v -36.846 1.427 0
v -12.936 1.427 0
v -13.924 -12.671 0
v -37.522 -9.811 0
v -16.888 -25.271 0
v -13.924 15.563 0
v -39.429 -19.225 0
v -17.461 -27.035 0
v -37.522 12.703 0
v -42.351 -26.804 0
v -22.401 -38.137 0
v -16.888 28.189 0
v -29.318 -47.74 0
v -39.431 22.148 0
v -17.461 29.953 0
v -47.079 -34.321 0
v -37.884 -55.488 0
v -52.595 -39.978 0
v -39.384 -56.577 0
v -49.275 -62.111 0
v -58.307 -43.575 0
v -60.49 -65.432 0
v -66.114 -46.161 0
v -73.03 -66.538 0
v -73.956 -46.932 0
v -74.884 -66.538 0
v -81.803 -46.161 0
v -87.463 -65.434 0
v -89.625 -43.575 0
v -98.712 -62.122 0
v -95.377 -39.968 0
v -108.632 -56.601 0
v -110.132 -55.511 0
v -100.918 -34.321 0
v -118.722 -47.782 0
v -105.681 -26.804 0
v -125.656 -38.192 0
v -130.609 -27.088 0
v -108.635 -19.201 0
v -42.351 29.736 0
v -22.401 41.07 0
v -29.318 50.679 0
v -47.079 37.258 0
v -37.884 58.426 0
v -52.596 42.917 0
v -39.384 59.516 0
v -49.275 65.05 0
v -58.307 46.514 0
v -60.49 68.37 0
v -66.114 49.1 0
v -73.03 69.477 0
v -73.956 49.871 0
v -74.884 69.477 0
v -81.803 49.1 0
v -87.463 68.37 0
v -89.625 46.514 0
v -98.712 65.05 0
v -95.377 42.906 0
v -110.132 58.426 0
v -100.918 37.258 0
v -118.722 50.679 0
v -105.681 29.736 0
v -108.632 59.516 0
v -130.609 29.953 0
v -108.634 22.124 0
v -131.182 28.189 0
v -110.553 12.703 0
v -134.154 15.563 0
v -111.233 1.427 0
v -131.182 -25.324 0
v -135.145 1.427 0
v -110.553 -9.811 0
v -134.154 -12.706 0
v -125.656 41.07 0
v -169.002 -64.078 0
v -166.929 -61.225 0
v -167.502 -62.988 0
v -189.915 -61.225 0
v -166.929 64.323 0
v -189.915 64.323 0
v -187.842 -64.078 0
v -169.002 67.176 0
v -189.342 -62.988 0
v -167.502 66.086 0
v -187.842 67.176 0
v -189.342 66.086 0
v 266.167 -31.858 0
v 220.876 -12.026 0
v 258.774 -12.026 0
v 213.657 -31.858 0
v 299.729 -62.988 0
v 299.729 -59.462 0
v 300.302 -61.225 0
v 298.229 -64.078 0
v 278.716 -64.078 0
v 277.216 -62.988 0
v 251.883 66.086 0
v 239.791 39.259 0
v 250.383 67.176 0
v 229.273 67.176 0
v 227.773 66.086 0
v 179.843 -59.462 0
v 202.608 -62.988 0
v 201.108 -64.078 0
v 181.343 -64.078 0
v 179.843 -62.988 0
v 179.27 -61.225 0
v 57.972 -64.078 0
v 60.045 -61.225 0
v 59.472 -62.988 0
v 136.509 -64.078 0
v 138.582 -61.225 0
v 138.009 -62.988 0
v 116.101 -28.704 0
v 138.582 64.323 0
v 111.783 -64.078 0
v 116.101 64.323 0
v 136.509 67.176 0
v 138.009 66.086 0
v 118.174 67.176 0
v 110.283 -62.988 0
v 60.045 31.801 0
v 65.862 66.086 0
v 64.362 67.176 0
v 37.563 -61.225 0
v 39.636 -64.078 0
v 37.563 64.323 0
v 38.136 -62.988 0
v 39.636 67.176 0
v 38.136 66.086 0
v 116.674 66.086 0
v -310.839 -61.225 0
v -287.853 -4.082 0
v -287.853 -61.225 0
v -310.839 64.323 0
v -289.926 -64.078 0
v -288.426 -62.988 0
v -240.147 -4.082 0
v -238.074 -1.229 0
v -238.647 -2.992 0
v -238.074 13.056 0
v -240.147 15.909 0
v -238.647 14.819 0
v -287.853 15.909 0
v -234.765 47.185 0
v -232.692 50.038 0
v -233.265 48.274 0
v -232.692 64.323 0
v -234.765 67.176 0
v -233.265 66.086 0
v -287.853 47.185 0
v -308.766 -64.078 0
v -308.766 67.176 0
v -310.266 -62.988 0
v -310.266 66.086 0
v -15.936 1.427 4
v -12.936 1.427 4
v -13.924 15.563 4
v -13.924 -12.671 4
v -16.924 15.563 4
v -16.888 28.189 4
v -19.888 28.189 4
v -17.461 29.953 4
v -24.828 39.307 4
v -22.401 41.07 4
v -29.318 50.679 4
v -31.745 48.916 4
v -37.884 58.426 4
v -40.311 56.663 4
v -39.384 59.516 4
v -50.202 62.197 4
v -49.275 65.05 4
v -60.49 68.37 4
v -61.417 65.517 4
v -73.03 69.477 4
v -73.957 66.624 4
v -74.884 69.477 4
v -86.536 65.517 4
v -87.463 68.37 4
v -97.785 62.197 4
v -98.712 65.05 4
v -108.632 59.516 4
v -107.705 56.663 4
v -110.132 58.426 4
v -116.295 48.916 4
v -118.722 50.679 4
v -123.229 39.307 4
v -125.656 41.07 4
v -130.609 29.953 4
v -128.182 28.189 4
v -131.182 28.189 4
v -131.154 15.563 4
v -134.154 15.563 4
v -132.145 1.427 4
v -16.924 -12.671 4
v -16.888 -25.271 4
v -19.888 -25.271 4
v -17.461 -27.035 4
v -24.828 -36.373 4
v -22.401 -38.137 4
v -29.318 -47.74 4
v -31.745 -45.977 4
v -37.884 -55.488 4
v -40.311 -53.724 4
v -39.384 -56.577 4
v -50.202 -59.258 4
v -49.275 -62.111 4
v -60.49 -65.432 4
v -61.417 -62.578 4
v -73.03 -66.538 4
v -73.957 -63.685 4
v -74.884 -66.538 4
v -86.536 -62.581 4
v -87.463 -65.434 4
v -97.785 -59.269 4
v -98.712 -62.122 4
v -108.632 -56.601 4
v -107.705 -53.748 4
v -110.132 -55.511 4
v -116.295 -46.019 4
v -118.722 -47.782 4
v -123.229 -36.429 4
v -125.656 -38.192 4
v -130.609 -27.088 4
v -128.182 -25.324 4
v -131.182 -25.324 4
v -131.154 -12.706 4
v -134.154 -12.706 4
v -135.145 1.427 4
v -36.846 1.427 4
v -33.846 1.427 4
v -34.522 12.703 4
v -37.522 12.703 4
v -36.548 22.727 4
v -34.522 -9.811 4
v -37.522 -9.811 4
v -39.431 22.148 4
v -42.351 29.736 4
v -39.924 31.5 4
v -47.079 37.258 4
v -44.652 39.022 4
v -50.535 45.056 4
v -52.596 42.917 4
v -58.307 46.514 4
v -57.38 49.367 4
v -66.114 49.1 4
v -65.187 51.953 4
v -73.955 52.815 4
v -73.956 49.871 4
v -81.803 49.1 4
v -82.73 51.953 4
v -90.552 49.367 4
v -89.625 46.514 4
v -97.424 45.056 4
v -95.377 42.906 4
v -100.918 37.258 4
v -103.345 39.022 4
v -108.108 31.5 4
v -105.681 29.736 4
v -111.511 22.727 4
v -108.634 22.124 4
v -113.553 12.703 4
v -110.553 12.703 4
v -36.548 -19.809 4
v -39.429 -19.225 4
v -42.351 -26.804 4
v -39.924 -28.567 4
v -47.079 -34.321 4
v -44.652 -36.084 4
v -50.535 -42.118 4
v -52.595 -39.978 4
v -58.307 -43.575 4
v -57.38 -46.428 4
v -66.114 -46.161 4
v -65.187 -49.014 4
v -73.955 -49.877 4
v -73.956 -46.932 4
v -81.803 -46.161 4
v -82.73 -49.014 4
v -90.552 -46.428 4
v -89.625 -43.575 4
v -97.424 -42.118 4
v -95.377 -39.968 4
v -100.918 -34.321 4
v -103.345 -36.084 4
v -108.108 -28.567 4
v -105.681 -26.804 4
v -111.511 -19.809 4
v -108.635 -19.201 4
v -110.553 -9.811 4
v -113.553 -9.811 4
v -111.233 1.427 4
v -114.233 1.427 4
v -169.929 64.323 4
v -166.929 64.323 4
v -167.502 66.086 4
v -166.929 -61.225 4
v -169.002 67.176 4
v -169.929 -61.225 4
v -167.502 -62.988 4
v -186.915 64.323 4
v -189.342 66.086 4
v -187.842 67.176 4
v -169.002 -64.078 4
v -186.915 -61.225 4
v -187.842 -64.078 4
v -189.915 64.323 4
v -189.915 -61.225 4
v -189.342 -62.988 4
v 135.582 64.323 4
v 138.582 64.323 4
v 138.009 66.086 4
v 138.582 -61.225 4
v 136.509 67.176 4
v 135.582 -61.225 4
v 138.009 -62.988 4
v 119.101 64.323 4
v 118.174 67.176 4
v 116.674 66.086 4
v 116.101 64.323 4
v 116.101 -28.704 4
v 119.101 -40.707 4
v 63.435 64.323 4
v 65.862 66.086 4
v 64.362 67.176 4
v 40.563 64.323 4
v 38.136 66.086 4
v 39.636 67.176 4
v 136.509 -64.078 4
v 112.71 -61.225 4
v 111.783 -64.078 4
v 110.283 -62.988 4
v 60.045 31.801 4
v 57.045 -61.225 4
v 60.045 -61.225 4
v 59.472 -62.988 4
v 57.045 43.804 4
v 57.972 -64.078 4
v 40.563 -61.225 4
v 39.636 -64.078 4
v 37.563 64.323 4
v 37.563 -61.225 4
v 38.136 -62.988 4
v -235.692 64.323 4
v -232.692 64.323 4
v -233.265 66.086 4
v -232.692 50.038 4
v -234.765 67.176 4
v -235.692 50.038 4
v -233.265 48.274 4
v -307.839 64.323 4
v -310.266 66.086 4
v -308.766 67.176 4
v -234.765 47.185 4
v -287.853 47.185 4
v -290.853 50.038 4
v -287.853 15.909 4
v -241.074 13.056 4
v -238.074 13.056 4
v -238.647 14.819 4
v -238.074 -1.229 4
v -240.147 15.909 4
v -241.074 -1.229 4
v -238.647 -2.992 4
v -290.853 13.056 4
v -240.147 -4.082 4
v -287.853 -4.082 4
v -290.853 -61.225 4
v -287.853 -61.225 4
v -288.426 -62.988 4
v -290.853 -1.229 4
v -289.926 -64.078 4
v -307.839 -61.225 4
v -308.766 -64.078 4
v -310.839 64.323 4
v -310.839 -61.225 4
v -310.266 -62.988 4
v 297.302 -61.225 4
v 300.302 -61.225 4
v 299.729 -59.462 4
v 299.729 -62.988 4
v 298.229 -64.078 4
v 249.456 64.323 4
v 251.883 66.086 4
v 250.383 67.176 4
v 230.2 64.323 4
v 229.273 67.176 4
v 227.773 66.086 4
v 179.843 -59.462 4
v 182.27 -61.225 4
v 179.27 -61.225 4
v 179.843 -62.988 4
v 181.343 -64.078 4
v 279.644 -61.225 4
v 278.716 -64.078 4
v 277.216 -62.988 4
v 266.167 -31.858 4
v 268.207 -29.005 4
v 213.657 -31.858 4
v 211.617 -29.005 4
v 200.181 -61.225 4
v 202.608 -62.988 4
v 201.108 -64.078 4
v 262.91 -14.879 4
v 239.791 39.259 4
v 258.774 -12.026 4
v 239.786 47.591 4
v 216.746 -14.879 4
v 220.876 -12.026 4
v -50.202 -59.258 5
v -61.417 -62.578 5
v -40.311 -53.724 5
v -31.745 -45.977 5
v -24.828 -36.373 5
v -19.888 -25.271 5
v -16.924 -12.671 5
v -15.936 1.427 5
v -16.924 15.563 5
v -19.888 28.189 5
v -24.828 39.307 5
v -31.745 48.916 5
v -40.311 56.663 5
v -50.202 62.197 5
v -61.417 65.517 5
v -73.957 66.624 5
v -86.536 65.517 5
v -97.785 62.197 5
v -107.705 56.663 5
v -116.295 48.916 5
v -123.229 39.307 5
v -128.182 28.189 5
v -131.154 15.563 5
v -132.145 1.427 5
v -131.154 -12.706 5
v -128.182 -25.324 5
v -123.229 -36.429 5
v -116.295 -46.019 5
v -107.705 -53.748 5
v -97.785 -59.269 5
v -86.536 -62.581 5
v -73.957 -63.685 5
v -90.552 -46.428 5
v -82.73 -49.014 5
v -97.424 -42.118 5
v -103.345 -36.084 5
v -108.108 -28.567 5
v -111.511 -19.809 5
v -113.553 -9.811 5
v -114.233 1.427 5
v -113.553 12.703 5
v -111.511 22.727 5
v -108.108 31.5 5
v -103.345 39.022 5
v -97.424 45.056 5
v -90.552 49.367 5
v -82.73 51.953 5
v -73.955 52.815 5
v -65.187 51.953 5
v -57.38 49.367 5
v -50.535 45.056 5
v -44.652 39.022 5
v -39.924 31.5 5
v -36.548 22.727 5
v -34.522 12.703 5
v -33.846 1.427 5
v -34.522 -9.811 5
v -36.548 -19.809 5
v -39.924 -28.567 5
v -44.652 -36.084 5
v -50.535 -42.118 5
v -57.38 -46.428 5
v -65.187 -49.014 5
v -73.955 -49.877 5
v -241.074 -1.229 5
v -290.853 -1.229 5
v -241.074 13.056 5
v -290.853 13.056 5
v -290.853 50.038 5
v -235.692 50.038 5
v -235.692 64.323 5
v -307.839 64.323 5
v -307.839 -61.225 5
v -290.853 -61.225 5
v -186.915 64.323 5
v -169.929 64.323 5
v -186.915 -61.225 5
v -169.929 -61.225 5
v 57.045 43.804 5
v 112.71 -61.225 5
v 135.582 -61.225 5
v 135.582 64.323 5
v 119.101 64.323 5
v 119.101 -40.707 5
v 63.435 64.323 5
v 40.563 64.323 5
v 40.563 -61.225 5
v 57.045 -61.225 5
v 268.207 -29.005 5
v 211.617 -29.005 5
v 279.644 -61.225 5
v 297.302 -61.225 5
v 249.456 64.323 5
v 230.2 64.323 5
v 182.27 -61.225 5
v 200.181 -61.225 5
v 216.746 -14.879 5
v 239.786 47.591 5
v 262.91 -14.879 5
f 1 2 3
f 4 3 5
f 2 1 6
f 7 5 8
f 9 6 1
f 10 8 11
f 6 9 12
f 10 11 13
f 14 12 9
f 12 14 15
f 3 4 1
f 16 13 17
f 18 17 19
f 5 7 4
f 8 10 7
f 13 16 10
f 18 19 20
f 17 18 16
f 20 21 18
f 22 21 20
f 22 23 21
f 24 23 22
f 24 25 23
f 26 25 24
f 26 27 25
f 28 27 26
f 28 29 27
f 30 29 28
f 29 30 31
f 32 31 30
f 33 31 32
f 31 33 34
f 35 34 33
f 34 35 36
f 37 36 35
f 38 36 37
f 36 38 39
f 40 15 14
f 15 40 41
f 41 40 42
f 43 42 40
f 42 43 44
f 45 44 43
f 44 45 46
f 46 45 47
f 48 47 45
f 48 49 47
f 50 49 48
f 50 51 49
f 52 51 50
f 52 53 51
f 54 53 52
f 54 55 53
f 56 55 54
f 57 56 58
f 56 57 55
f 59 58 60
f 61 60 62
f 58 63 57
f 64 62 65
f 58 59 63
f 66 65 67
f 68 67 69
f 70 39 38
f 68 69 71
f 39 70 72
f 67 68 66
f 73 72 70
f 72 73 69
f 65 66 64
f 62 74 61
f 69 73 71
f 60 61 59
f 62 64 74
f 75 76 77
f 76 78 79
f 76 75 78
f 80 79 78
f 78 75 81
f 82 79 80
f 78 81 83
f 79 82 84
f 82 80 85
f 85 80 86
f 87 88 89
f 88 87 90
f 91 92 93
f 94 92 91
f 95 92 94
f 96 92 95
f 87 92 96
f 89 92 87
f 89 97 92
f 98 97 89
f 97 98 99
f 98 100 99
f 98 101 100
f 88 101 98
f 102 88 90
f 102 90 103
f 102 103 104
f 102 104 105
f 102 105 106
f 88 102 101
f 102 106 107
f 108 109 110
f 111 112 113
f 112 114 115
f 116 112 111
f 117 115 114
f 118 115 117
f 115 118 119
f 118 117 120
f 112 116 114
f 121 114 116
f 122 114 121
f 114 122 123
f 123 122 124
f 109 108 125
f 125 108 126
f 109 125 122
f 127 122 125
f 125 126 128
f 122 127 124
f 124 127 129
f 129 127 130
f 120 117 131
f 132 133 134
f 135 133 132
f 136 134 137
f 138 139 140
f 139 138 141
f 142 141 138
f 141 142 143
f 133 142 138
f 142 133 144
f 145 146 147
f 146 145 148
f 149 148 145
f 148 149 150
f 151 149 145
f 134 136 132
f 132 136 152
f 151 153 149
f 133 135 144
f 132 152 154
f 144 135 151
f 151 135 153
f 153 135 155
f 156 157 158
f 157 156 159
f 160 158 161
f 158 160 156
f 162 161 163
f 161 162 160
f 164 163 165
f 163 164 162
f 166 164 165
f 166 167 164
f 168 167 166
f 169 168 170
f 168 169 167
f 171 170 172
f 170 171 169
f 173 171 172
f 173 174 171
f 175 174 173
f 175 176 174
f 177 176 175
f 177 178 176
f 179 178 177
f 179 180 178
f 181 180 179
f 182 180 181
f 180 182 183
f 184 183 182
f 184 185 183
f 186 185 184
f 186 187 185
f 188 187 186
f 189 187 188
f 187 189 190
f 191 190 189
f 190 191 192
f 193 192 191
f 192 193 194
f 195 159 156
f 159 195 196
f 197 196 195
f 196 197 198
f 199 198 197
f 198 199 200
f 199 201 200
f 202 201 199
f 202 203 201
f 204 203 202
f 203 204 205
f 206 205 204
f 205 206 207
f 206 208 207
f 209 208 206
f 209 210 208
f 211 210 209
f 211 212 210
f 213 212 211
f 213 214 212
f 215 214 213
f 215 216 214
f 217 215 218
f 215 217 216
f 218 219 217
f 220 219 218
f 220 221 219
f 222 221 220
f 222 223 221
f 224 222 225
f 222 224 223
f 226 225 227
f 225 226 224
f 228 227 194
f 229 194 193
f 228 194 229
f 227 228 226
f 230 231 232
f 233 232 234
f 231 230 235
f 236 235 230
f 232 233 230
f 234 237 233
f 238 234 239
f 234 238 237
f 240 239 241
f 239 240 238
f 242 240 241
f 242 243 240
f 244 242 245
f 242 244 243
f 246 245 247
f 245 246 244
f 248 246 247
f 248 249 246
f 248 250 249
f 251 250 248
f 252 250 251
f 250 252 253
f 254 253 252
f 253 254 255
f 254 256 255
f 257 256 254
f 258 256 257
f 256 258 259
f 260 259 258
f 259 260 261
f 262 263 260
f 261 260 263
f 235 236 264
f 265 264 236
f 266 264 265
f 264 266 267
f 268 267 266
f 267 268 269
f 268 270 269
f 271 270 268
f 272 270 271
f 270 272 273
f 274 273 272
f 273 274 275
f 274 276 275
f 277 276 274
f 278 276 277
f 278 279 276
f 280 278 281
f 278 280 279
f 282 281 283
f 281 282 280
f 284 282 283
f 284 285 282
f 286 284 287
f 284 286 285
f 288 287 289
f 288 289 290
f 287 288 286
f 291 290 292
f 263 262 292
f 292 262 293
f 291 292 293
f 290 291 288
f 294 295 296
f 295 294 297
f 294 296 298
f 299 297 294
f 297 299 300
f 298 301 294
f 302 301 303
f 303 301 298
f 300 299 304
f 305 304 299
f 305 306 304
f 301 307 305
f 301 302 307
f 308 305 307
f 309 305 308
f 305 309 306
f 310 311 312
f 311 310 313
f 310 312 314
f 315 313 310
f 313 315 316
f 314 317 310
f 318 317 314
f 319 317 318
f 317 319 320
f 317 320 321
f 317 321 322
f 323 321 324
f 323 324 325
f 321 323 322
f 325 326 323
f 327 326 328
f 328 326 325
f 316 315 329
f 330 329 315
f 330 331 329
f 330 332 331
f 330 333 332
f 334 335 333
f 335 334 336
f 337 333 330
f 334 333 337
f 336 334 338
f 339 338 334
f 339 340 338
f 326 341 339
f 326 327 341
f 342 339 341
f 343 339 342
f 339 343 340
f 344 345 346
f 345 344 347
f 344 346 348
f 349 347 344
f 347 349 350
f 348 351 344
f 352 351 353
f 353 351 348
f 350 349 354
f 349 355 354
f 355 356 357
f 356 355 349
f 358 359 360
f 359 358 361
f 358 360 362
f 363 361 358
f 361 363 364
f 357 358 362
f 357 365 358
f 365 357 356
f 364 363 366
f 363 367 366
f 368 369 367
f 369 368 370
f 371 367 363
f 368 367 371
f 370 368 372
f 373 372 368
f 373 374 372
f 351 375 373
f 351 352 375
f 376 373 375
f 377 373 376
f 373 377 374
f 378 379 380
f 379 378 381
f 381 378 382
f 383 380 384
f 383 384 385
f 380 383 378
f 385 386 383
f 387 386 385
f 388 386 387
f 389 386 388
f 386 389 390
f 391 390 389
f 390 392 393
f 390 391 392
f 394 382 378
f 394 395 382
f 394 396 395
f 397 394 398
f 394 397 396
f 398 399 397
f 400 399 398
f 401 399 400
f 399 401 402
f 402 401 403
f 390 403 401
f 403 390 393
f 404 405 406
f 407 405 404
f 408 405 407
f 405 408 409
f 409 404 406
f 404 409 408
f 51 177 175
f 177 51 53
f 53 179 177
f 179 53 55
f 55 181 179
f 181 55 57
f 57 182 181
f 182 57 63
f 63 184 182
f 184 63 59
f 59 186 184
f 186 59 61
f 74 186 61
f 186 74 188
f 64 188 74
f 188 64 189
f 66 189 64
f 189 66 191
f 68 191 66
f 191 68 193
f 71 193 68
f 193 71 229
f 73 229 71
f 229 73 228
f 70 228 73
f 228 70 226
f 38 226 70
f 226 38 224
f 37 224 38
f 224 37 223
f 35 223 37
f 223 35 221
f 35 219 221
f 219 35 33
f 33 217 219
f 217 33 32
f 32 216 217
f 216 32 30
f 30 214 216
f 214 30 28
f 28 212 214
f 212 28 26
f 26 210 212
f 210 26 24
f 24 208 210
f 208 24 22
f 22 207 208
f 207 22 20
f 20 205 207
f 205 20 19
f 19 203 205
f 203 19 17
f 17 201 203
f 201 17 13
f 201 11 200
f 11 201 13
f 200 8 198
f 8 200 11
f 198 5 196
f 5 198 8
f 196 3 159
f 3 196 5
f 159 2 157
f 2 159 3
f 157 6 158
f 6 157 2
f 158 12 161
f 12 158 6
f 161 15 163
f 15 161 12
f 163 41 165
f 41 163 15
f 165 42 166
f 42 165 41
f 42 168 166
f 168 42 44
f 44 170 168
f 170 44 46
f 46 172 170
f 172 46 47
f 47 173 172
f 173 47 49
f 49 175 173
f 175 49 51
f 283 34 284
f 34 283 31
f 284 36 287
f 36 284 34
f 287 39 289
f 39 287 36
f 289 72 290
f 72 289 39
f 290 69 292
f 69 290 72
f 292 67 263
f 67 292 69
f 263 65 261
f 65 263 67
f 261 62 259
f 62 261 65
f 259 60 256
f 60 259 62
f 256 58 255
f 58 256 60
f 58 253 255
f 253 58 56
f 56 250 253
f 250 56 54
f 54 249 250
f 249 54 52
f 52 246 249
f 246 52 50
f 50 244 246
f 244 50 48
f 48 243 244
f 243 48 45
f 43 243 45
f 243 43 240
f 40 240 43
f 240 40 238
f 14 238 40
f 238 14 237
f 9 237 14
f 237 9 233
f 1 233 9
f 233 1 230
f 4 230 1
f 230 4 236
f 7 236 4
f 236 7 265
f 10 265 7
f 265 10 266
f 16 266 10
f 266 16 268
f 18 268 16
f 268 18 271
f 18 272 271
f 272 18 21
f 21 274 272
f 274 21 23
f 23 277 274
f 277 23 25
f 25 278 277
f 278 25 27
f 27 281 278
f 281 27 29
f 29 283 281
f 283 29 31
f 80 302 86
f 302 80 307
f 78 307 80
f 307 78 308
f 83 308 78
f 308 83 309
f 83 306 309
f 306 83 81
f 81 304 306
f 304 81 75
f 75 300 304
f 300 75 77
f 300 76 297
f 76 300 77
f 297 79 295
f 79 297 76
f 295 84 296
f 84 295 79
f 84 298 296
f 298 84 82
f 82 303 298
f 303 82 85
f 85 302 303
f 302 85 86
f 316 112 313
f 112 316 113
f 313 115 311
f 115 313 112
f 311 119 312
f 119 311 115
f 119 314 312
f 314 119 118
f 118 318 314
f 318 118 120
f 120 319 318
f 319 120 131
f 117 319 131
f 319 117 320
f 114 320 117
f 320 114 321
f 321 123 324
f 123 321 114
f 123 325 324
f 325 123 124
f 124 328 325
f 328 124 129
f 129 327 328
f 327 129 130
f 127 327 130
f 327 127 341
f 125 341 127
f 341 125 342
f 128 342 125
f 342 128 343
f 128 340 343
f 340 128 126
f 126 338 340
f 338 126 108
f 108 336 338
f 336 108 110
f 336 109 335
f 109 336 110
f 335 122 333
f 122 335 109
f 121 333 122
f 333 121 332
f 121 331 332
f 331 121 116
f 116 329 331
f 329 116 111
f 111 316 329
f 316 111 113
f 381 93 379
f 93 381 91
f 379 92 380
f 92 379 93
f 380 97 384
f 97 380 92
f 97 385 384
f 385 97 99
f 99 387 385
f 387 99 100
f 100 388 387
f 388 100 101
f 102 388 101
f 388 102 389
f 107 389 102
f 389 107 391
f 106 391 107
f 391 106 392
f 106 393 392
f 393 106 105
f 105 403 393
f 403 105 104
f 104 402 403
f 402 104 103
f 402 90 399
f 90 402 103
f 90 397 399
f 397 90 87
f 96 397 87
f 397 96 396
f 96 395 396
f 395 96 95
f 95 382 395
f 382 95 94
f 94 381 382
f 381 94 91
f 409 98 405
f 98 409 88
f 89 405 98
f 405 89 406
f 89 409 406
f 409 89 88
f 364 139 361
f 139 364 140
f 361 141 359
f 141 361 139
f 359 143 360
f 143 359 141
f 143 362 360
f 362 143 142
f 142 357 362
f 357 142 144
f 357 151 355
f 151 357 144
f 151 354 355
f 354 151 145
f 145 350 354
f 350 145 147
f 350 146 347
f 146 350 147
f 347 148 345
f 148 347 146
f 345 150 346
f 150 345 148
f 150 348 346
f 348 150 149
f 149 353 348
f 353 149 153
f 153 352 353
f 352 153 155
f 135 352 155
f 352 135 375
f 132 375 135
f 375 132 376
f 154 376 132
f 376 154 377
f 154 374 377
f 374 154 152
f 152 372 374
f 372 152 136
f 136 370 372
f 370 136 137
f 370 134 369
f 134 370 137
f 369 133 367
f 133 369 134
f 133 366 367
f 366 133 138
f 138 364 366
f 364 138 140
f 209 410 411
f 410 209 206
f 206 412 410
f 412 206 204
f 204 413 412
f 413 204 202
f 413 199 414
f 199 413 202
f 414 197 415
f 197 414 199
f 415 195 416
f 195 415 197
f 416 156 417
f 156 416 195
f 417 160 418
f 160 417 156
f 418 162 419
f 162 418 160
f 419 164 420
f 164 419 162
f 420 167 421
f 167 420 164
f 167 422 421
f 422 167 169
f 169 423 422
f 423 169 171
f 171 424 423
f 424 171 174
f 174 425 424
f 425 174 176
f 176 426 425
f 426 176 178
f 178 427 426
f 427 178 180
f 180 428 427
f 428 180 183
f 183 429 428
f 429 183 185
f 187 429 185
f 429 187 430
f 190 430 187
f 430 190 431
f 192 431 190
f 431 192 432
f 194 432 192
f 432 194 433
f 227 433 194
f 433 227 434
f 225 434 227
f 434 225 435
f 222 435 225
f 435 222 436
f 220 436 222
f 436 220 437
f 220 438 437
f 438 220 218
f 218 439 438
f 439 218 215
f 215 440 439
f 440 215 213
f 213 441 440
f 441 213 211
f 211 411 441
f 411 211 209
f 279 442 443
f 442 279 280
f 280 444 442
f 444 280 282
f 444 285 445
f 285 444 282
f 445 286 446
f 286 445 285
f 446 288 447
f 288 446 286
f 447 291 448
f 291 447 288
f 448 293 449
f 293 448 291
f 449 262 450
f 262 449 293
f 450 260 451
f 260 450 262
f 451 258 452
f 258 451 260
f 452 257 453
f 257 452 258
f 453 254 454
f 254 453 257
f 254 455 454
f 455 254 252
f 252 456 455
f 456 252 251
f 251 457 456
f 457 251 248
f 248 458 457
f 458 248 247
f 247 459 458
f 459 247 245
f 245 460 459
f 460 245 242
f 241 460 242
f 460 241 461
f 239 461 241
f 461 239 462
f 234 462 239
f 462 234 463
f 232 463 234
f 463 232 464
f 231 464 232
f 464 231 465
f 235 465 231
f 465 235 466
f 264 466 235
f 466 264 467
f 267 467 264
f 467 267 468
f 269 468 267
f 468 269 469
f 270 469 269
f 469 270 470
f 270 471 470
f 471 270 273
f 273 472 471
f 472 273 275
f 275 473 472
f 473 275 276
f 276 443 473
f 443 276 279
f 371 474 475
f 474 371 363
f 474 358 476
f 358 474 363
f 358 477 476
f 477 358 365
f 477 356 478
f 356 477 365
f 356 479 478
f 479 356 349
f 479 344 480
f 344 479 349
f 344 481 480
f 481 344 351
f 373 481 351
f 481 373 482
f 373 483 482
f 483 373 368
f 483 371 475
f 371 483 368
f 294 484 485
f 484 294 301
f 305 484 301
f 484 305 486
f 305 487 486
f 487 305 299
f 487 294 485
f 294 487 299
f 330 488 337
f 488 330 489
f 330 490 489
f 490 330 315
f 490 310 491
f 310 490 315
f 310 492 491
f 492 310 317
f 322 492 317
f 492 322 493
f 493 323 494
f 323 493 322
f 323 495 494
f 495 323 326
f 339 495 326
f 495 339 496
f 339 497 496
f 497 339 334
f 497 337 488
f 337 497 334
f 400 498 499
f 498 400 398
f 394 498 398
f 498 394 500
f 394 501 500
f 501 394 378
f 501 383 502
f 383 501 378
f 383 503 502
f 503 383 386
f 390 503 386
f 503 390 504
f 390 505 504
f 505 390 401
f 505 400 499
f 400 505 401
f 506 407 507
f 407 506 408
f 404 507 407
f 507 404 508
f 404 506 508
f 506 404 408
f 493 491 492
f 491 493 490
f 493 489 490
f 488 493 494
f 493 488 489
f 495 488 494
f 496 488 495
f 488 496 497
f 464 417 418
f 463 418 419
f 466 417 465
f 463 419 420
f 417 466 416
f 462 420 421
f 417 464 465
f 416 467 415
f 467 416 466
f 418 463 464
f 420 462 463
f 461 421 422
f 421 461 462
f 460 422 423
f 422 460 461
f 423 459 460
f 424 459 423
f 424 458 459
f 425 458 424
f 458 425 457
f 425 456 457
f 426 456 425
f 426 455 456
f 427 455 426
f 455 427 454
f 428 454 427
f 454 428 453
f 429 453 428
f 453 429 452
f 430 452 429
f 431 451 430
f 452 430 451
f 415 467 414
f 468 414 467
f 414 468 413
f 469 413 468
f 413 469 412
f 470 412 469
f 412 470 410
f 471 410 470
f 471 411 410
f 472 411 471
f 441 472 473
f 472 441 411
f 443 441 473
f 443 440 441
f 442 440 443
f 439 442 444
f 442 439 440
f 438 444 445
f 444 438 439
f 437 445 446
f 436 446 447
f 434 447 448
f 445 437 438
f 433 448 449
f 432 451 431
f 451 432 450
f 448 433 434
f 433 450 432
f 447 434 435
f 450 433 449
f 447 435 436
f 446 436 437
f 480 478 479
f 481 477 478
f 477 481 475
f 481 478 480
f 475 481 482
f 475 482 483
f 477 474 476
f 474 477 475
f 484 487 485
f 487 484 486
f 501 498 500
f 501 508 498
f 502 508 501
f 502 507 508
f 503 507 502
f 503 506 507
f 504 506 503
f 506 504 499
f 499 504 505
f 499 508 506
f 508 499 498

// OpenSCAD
// Parameters
// $fn = 128;

text = "FIONA";

border_width = 3;
height = 4;
size_mm = 130;

// Increased spacing to separate the letters
letter_spacing = 1.25; // Adjust this value as needed

module word(t) {
    text(t,
            size = size_mm - border_width * 2,
            font = "American Typewriter",
            halign = "center",
            valign = "center",
            spacing = letter_spacing);
}

difference() {
    color("red") {
        linear_extrude(height = height) {
            minkowski() {
                circle(r = border_width);
                word(text);
            }
        }
    }

    linear_extrude(height = height) {
        word(text);
    }
}

color("blue") {
    linear_extrude(height = height + 1) {
        word(text);
    }
}
